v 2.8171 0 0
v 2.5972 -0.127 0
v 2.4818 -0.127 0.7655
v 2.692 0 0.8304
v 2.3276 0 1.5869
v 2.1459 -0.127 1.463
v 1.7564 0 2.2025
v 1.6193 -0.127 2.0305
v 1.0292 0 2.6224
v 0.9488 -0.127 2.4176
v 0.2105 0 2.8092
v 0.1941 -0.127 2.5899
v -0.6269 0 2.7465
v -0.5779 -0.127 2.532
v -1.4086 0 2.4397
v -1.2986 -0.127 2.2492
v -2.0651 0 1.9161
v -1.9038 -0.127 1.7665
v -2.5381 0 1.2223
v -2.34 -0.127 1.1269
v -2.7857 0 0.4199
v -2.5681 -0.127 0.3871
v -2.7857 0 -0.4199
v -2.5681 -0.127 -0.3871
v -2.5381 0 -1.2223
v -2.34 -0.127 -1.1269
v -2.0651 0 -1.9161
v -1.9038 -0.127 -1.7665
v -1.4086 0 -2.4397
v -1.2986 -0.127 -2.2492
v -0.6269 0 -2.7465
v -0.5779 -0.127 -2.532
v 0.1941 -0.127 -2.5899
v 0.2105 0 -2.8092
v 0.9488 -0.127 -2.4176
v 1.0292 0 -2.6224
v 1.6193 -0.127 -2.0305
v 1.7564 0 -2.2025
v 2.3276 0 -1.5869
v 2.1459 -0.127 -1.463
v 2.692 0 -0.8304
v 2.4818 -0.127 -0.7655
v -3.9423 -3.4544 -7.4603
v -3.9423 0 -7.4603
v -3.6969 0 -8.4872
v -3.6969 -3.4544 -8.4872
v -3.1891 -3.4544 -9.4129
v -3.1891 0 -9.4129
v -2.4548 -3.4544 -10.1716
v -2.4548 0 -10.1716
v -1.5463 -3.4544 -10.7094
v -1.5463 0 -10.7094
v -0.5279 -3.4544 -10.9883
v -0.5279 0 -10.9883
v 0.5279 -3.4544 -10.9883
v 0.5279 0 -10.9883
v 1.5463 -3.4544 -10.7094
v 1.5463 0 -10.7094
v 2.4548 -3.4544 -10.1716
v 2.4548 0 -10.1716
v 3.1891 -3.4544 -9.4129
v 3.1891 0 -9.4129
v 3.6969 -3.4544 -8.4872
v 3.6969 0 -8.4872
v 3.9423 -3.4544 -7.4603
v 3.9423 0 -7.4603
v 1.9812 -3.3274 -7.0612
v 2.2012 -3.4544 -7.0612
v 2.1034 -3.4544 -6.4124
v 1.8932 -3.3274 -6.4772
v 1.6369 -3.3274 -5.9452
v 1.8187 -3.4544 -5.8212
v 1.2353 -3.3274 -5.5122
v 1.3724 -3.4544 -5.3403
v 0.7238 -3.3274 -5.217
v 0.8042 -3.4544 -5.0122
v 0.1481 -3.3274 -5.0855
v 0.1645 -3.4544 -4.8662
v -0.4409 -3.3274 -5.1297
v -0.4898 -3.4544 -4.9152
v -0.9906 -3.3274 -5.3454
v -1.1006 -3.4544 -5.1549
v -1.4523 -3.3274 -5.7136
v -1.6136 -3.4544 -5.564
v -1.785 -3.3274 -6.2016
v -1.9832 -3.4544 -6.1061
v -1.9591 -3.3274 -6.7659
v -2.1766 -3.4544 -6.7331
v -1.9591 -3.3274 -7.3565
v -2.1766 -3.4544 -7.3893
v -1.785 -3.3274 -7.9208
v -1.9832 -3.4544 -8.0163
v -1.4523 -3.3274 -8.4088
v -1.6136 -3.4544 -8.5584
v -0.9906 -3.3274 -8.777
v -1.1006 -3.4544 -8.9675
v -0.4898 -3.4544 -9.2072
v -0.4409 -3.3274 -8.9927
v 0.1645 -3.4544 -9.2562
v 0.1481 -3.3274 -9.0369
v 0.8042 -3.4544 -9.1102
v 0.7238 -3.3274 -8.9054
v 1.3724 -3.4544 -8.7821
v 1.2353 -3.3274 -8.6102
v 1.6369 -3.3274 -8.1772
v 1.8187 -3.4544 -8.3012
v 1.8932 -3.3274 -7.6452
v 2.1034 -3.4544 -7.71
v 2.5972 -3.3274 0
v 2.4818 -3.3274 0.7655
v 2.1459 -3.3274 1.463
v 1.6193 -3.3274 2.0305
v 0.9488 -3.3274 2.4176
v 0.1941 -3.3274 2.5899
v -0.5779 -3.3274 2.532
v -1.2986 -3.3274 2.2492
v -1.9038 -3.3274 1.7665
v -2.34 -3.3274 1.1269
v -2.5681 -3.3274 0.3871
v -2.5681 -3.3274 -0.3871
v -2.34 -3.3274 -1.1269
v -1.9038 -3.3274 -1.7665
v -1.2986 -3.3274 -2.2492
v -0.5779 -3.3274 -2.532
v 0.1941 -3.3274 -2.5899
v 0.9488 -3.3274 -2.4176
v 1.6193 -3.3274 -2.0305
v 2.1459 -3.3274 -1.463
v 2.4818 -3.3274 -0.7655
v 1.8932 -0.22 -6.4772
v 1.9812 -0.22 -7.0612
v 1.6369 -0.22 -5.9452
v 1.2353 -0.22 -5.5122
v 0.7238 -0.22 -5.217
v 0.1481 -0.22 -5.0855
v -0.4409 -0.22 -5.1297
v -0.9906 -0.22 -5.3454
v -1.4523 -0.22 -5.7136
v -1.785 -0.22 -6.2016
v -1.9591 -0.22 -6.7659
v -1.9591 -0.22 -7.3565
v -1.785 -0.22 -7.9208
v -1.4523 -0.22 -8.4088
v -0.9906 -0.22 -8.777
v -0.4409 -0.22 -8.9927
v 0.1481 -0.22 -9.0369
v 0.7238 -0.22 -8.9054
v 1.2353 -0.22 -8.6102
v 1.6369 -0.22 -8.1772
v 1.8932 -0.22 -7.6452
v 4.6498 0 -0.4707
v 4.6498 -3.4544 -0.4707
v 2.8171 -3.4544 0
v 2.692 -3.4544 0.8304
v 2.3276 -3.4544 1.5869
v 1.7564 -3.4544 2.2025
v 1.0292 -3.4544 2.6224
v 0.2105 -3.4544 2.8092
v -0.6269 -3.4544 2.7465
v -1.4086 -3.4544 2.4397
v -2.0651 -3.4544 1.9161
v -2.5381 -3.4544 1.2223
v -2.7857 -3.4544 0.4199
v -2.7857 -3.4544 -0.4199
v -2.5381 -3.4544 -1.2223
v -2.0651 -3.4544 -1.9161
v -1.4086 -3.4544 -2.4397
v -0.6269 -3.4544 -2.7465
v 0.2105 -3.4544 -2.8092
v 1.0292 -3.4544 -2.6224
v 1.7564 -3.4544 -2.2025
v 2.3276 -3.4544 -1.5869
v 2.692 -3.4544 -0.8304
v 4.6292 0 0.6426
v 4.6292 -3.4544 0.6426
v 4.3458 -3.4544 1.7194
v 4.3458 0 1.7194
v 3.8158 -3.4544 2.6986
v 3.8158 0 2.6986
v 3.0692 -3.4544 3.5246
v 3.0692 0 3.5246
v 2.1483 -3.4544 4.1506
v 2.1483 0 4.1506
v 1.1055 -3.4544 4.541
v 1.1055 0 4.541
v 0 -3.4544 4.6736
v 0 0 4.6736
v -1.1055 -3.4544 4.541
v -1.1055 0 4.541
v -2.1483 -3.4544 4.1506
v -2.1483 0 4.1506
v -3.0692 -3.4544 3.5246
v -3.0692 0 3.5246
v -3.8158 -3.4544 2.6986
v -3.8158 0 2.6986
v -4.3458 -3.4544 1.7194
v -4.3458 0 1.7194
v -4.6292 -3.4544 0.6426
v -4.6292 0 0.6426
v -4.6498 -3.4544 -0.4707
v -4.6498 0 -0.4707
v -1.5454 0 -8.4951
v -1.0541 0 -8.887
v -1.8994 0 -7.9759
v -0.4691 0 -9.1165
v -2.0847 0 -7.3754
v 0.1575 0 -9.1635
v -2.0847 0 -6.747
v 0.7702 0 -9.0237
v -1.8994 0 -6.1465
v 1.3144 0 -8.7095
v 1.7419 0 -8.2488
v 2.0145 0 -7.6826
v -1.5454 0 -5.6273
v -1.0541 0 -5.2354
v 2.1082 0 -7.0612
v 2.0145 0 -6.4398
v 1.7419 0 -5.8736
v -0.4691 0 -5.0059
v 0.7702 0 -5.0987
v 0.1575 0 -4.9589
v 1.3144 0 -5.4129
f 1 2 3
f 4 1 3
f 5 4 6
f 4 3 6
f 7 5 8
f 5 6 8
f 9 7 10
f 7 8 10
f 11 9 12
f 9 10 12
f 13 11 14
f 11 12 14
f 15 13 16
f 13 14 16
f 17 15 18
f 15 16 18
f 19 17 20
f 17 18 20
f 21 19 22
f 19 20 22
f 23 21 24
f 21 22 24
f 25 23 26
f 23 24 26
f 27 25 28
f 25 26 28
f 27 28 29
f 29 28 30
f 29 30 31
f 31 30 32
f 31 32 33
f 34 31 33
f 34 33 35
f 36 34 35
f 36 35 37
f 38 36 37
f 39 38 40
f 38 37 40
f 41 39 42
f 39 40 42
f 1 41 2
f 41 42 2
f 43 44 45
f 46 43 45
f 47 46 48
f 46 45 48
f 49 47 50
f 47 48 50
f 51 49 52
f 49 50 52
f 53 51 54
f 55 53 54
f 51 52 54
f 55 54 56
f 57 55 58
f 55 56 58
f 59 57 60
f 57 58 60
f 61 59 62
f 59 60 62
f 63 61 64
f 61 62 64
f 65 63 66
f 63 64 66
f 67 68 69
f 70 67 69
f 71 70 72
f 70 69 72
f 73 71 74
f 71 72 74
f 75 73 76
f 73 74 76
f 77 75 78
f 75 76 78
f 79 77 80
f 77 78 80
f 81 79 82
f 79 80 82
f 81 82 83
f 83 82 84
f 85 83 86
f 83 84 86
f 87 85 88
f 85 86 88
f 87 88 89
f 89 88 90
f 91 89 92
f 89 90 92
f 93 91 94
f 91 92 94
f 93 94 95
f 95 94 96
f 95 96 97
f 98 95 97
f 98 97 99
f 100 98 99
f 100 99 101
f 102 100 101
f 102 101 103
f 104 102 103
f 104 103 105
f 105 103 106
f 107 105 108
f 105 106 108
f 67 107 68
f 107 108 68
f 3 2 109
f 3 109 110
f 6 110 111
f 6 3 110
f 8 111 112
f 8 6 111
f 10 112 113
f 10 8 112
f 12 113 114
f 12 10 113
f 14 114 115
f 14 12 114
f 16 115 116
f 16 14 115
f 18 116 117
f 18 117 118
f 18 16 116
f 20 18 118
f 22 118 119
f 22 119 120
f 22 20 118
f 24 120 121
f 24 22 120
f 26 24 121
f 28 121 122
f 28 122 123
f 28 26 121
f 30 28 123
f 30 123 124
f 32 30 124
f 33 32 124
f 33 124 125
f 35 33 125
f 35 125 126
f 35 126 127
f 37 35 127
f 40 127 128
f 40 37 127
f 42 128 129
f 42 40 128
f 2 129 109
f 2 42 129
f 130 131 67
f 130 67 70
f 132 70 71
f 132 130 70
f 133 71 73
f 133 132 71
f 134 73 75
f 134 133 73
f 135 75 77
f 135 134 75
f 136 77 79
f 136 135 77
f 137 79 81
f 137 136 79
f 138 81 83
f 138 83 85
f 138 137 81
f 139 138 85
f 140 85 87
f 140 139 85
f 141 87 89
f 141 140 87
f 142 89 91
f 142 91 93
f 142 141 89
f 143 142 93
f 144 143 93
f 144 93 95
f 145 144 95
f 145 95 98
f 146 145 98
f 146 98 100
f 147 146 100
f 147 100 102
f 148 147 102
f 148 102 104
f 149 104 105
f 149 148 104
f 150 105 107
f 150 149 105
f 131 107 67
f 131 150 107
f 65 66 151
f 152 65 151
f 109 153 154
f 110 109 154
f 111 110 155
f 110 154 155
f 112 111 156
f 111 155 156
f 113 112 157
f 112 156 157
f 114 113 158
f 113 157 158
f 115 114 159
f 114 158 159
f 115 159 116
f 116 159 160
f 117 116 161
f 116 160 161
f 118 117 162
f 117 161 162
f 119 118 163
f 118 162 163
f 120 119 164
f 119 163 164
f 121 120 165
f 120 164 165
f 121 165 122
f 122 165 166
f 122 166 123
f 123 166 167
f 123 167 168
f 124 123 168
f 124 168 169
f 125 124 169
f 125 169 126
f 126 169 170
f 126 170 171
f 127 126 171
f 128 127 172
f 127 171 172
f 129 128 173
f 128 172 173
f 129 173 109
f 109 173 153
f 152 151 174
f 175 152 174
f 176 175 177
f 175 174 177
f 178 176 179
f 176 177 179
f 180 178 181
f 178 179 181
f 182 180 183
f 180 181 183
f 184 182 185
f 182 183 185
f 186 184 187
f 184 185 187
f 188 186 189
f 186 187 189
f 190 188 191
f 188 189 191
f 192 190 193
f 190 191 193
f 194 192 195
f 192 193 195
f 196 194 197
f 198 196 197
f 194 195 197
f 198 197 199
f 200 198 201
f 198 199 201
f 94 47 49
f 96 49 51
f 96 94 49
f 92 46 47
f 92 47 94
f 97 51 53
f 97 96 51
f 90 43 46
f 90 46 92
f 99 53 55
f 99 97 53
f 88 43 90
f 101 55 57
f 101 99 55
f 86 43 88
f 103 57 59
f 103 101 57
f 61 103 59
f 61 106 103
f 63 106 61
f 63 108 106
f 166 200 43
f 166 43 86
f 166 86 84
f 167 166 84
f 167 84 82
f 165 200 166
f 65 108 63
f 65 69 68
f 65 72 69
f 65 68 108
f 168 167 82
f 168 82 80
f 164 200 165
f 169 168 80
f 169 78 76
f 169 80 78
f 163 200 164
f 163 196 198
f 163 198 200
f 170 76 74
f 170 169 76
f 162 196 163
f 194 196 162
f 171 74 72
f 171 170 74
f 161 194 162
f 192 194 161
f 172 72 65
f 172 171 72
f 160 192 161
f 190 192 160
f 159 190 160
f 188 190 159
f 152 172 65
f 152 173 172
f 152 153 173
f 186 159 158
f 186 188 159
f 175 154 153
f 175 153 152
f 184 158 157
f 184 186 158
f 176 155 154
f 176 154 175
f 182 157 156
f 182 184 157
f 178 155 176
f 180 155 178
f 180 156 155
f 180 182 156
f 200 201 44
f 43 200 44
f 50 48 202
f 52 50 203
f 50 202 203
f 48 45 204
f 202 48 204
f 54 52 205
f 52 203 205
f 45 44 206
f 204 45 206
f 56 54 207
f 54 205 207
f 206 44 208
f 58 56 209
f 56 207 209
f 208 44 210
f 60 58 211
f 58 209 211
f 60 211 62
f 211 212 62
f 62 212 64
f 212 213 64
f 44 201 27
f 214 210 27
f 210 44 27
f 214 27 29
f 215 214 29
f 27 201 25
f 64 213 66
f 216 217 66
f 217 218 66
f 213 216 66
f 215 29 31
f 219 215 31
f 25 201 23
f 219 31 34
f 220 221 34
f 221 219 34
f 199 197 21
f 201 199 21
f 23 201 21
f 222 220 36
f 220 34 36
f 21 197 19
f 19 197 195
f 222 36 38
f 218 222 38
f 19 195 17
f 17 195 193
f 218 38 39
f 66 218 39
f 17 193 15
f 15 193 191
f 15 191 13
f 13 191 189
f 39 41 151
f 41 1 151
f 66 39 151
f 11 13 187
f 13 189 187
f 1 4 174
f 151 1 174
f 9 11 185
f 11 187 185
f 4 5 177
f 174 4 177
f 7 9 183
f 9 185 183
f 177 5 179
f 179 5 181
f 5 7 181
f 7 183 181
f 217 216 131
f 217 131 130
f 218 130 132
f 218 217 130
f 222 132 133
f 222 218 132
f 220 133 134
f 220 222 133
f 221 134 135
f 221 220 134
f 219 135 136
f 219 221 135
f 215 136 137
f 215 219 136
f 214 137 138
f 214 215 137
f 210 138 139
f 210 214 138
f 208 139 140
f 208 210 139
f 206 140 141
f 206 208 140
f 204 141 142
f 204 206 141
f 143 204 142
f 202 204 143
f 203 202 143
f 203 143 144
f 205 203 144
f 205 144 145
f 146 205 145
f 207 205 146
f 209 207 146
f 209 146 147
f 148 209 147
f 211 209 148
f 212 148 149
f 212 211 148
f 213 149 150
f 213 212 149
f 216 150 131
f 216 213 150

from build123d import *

# Parameters (mm, degrees)
F0_R        = 1.9812
F0_R_2      = 2.59715
F1_DEPTH    = 3.4544
F2_C1_SIZE2 = 0.127
F2_C1_SIZE  = 0.2199704526
F2_C2_SIZE2 = 0.2199704526
F2_C2_SIZE  = 0.127
F2_C3_SIZE2 = 0.127
F2_C3_SIZE  = 0.2199704526
F2_C4_SIZE2 = 0.2199704526
F2_C4_SIZE  = 0.127


with BuildPart() as f1:
    # F0 (on Front) → F1 (new body)
    with BuildSketch(Plane.XZ):
        with BuildLine():
            Line((-4.6498341341, -0.4707223022), (-3.9422506789, -7.4602906475))
            ThreePointArc((-3.9422506789, -7.4602906475), (0, -11.0236), (3.9422506789, -7.4602906475))
            Line((3.9422506789, -7.4602906475), (4.6498341341, -0.4707223022))
            ThreePointArc((4.6498341341, -0.4707223022), (0, 4.6736), (-4.6498341341, -0.4707223022))
        make_face()
        with Locations((0, -7.0612)):
            Circle(F0_R, mode=Mode.SUBTRACT)
        Circle(F0_R_2, mode=Mode.SUBTRACT)
    extrude(amount=F1_DEPTH)

    # F2: chamfer of 0.127 x 0.2199704526 on 4 edges, made by hand

    # F2_c1
    f2_c1_edges = [f1.edges().sort_by_distance(p)[0] for p in [
        (-1.9812, 0, -7.0612),
    ]]
    f2_c1_side = f1.faces().sort_by_distance((-1.9812, -0.00254, -7.0612))[0]
    chamfer(f2_c1_edges, length=F2_C1_SIZE, length2=F2_C1_SIZE2, reference=f2_c1_side)

    # F2_c2
    f2_c2_edges = [f1.edges().sort_by_distance(p)[0] for p in [
        (-1.9812, -3.4544, -7.0612),
    ]]
    f2_c2_side = f1.faces().sort_by_distance((-1.9812, -3.45186, -7.0612))[0]
    chamfer(f2_c2_edges, length=F2_C2_SIZE, length2=F2_C2_SIZE2, reference=f2_c2_side)

    # F2_c3
    f2_c3_edges = [f1.edges().sort_by_distance(p)[0] for p in [
        (-2.59715, 0, 0),
    ]]
    f2_c3_side = f1.faces().sort_by_distance((-2.59969, 0, 0))[0]
    chamfer(f2_c3_edges, length=F2_C3_SIZE, length2=F2_C3_SIZE2, reference=f2_c3_side)

    # F2_c4
    f2_c4_edges = [f1.edges().sort_by_distance(p)[0] for p in [
        (-2.59715, -3.4544, 0),
    ]]
    f2_c4_side = f1.faces().sort_by_distance((-2.59715, -3.45186, 0))[0]
    chamfer(f2_c4_edges, length=F2_C4_SIZE, length2=F2_C4_SIZE2, reference=f2_c4_side)


solid = f1.part
